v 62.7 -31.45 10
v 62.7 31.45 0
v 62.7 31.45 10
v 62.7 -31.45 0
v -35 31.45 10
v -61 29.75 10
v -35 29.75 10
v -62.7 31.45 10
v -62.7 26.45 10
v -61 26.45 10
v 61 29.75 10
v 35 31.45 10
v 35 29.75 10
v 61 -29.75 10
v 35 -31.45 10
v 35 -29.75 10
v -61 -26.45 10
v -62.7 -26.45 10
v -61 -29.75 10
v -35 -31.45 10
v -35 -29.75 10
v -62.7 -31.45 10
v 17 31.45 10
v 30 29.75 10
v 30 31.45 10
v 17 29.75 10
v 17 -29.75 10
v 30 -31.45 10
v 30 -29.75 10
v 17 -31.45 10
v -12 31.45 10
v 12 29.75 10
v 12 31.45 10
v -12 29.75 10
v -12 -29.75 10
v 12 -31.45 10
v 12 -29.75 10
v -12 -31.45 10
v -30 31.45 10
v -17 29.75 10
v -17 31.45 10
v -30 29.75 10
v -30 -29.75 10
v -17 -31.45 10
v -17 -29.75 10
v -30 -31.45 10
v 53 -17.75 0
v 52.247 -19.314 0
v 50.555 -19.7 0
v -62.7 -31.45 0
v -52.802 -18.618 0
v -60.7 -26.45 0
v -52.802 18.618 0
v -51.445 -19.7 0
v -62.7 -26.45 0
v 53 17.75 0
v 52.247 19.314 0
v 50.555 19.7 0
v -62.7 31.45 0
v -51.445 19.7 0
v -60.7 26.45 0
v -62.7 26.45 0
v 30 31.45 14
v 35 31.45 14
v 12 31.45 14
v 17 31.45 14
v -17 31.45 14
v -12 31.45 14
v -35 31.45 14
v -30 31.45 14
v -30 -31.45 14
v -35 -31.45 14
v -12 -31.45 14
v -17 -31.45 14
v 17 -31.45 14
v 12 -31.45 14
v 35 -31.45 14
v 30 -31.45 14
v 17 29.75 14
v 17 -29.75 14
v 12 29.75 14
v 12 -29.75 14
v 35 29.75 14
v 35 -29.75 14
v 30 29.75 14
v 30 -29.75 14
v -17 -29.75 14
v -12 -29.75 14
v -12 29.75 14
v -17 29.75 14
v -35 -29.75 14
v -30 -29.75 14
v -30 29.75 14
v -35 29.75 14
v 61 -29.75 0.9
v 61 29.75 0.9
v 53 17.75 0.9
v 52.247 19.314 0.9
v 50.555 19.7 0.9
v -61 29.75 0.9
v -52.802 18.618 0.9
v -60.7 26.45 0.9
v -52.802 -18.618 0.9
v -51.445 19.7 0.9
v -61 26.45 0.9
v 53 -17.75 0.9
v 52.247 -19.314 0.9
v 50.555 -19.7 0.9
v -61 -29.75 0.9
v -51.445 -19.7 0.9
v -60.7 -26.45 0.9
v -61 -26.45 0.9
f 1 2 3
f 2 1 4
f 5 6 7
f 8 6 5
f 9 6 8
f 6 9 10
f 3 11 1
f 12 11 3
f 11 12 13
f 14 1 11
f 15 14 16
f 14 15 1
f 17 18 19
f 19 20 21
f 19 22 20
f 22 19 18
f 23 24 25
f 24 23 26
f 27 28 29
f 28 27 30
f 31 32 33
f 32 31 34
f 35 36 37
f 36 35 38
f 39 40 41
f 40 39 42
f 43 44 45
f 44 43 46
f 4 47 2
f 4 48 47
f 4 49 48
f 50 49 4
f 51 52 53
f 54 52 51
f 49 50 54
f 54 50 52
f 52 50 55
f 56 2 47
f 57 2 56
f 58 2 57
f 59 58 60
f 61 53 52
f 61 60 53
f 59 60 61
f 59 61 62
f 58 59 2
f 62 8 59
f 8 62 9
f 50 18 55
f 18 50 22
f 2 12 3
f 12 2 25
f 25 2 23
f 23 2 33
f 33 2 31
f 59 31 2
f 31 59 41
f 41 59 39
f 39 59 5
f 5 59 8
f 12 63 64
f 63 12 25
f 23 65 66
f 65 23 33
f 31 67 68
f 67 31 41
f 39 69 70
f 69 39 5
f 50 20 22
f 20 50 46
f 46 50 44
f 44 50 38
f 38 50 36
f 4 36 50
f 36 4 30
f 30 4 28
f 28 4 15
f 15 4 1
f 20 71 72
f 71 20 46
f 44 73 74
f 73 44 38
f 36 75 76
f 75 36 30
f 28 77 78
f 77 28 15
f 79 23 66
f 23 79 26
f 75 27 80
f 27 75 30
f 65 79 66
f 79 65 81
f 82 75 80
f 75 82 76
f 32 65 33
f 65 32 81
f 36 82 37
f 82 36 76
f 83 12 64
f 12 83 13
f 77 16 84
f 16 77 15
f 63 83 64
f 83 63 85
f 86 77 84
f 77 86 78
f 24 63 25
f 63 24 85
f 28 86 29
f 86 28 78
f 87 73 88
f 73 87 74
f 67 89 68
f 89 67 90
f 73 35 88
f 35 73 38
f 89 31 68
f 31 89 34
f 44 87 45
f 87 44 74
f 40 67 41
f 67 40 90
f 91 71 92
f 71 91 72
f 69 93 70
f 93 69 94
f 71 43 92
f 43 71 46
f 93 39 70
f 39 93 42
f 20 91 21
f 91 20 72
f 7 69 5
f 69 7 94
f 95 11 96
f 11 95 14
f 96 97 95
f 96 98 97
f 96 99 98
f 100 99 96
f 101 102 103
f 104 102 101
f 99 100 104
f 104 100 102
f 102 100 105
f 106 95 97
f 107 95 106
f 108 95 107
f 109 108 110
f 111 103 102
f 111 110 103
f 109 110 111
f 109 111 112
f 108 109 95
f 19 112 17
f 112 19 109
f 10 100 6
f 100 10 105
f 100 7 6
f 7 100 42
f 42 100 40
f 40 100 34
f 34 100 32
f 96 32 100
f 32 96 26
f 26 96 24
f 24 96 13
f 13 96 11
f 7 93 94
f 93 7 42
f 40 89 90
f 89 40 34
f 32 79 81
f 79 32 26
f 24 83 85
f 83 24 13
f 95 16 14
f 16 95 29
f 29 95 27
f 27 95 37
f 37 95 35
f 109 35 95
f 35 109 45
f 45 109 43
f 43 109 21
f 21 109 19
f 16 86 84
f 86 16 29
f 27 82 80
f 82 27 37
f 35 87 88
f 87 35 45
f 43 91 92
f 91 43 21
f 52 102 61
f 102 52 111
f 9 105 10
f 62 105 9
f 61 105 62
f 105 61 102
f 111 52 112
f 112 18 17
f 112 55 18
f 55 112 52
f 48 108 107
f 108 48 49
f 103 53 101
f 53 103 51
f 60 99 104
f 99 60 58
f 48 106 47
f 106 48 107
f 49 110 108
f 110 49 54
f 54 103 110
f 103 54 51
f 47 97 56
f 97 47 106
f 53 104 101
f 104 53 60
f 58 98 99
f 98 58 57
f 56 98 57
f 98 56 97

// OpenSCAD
xId = 122;
yId = 59.5;
zOd = 10;

wallThick = 1.7;
botThick  = 0.9;

xOd = xId + 2*wallThick;
yOd = yId + 2*wallThick;

difference() {
   union() {
      translate([-xOd/2, -yOd/2, ]) cube([xOd, yOd, zOd]);
      translate([12,-yOd/2,0]) cube([5, yOd, 14]);
      translate([12+5+13,-yOd/2,0]) cube([5, yOd, 14]);
      mirror([1,0,0]) translate([12,-yOd/2,0]) cube([5, yOd, 14]);
      mirror([1,0,0]) translate([12+5+13,-yOd/2,0]) cube([5, yOd, 14]);
   }
   union() /* diff */ {
      translate([-xId/2, -yId/2, botThick]) cube([xId, yId, 20]);
      translate([-xOd/2-3, -(yOd-10)/2,-1]) cube([5, yOd-10, 20]);
      hull() {
         translate([xId/2-10,yId/2-12,-1]) cylinder(r=2,h=22);
         translate([-xId/2+10, yId/2-12,-1]) cylinder(r=2,h=22);
         translate([-xId/2+10,-yId/2+12,-1]) cylinder(r=2,h=22);
         translate([xId/2-10, -yId/2+12,-1]) cylinder(r=2,h=22);
      }
   }
}
